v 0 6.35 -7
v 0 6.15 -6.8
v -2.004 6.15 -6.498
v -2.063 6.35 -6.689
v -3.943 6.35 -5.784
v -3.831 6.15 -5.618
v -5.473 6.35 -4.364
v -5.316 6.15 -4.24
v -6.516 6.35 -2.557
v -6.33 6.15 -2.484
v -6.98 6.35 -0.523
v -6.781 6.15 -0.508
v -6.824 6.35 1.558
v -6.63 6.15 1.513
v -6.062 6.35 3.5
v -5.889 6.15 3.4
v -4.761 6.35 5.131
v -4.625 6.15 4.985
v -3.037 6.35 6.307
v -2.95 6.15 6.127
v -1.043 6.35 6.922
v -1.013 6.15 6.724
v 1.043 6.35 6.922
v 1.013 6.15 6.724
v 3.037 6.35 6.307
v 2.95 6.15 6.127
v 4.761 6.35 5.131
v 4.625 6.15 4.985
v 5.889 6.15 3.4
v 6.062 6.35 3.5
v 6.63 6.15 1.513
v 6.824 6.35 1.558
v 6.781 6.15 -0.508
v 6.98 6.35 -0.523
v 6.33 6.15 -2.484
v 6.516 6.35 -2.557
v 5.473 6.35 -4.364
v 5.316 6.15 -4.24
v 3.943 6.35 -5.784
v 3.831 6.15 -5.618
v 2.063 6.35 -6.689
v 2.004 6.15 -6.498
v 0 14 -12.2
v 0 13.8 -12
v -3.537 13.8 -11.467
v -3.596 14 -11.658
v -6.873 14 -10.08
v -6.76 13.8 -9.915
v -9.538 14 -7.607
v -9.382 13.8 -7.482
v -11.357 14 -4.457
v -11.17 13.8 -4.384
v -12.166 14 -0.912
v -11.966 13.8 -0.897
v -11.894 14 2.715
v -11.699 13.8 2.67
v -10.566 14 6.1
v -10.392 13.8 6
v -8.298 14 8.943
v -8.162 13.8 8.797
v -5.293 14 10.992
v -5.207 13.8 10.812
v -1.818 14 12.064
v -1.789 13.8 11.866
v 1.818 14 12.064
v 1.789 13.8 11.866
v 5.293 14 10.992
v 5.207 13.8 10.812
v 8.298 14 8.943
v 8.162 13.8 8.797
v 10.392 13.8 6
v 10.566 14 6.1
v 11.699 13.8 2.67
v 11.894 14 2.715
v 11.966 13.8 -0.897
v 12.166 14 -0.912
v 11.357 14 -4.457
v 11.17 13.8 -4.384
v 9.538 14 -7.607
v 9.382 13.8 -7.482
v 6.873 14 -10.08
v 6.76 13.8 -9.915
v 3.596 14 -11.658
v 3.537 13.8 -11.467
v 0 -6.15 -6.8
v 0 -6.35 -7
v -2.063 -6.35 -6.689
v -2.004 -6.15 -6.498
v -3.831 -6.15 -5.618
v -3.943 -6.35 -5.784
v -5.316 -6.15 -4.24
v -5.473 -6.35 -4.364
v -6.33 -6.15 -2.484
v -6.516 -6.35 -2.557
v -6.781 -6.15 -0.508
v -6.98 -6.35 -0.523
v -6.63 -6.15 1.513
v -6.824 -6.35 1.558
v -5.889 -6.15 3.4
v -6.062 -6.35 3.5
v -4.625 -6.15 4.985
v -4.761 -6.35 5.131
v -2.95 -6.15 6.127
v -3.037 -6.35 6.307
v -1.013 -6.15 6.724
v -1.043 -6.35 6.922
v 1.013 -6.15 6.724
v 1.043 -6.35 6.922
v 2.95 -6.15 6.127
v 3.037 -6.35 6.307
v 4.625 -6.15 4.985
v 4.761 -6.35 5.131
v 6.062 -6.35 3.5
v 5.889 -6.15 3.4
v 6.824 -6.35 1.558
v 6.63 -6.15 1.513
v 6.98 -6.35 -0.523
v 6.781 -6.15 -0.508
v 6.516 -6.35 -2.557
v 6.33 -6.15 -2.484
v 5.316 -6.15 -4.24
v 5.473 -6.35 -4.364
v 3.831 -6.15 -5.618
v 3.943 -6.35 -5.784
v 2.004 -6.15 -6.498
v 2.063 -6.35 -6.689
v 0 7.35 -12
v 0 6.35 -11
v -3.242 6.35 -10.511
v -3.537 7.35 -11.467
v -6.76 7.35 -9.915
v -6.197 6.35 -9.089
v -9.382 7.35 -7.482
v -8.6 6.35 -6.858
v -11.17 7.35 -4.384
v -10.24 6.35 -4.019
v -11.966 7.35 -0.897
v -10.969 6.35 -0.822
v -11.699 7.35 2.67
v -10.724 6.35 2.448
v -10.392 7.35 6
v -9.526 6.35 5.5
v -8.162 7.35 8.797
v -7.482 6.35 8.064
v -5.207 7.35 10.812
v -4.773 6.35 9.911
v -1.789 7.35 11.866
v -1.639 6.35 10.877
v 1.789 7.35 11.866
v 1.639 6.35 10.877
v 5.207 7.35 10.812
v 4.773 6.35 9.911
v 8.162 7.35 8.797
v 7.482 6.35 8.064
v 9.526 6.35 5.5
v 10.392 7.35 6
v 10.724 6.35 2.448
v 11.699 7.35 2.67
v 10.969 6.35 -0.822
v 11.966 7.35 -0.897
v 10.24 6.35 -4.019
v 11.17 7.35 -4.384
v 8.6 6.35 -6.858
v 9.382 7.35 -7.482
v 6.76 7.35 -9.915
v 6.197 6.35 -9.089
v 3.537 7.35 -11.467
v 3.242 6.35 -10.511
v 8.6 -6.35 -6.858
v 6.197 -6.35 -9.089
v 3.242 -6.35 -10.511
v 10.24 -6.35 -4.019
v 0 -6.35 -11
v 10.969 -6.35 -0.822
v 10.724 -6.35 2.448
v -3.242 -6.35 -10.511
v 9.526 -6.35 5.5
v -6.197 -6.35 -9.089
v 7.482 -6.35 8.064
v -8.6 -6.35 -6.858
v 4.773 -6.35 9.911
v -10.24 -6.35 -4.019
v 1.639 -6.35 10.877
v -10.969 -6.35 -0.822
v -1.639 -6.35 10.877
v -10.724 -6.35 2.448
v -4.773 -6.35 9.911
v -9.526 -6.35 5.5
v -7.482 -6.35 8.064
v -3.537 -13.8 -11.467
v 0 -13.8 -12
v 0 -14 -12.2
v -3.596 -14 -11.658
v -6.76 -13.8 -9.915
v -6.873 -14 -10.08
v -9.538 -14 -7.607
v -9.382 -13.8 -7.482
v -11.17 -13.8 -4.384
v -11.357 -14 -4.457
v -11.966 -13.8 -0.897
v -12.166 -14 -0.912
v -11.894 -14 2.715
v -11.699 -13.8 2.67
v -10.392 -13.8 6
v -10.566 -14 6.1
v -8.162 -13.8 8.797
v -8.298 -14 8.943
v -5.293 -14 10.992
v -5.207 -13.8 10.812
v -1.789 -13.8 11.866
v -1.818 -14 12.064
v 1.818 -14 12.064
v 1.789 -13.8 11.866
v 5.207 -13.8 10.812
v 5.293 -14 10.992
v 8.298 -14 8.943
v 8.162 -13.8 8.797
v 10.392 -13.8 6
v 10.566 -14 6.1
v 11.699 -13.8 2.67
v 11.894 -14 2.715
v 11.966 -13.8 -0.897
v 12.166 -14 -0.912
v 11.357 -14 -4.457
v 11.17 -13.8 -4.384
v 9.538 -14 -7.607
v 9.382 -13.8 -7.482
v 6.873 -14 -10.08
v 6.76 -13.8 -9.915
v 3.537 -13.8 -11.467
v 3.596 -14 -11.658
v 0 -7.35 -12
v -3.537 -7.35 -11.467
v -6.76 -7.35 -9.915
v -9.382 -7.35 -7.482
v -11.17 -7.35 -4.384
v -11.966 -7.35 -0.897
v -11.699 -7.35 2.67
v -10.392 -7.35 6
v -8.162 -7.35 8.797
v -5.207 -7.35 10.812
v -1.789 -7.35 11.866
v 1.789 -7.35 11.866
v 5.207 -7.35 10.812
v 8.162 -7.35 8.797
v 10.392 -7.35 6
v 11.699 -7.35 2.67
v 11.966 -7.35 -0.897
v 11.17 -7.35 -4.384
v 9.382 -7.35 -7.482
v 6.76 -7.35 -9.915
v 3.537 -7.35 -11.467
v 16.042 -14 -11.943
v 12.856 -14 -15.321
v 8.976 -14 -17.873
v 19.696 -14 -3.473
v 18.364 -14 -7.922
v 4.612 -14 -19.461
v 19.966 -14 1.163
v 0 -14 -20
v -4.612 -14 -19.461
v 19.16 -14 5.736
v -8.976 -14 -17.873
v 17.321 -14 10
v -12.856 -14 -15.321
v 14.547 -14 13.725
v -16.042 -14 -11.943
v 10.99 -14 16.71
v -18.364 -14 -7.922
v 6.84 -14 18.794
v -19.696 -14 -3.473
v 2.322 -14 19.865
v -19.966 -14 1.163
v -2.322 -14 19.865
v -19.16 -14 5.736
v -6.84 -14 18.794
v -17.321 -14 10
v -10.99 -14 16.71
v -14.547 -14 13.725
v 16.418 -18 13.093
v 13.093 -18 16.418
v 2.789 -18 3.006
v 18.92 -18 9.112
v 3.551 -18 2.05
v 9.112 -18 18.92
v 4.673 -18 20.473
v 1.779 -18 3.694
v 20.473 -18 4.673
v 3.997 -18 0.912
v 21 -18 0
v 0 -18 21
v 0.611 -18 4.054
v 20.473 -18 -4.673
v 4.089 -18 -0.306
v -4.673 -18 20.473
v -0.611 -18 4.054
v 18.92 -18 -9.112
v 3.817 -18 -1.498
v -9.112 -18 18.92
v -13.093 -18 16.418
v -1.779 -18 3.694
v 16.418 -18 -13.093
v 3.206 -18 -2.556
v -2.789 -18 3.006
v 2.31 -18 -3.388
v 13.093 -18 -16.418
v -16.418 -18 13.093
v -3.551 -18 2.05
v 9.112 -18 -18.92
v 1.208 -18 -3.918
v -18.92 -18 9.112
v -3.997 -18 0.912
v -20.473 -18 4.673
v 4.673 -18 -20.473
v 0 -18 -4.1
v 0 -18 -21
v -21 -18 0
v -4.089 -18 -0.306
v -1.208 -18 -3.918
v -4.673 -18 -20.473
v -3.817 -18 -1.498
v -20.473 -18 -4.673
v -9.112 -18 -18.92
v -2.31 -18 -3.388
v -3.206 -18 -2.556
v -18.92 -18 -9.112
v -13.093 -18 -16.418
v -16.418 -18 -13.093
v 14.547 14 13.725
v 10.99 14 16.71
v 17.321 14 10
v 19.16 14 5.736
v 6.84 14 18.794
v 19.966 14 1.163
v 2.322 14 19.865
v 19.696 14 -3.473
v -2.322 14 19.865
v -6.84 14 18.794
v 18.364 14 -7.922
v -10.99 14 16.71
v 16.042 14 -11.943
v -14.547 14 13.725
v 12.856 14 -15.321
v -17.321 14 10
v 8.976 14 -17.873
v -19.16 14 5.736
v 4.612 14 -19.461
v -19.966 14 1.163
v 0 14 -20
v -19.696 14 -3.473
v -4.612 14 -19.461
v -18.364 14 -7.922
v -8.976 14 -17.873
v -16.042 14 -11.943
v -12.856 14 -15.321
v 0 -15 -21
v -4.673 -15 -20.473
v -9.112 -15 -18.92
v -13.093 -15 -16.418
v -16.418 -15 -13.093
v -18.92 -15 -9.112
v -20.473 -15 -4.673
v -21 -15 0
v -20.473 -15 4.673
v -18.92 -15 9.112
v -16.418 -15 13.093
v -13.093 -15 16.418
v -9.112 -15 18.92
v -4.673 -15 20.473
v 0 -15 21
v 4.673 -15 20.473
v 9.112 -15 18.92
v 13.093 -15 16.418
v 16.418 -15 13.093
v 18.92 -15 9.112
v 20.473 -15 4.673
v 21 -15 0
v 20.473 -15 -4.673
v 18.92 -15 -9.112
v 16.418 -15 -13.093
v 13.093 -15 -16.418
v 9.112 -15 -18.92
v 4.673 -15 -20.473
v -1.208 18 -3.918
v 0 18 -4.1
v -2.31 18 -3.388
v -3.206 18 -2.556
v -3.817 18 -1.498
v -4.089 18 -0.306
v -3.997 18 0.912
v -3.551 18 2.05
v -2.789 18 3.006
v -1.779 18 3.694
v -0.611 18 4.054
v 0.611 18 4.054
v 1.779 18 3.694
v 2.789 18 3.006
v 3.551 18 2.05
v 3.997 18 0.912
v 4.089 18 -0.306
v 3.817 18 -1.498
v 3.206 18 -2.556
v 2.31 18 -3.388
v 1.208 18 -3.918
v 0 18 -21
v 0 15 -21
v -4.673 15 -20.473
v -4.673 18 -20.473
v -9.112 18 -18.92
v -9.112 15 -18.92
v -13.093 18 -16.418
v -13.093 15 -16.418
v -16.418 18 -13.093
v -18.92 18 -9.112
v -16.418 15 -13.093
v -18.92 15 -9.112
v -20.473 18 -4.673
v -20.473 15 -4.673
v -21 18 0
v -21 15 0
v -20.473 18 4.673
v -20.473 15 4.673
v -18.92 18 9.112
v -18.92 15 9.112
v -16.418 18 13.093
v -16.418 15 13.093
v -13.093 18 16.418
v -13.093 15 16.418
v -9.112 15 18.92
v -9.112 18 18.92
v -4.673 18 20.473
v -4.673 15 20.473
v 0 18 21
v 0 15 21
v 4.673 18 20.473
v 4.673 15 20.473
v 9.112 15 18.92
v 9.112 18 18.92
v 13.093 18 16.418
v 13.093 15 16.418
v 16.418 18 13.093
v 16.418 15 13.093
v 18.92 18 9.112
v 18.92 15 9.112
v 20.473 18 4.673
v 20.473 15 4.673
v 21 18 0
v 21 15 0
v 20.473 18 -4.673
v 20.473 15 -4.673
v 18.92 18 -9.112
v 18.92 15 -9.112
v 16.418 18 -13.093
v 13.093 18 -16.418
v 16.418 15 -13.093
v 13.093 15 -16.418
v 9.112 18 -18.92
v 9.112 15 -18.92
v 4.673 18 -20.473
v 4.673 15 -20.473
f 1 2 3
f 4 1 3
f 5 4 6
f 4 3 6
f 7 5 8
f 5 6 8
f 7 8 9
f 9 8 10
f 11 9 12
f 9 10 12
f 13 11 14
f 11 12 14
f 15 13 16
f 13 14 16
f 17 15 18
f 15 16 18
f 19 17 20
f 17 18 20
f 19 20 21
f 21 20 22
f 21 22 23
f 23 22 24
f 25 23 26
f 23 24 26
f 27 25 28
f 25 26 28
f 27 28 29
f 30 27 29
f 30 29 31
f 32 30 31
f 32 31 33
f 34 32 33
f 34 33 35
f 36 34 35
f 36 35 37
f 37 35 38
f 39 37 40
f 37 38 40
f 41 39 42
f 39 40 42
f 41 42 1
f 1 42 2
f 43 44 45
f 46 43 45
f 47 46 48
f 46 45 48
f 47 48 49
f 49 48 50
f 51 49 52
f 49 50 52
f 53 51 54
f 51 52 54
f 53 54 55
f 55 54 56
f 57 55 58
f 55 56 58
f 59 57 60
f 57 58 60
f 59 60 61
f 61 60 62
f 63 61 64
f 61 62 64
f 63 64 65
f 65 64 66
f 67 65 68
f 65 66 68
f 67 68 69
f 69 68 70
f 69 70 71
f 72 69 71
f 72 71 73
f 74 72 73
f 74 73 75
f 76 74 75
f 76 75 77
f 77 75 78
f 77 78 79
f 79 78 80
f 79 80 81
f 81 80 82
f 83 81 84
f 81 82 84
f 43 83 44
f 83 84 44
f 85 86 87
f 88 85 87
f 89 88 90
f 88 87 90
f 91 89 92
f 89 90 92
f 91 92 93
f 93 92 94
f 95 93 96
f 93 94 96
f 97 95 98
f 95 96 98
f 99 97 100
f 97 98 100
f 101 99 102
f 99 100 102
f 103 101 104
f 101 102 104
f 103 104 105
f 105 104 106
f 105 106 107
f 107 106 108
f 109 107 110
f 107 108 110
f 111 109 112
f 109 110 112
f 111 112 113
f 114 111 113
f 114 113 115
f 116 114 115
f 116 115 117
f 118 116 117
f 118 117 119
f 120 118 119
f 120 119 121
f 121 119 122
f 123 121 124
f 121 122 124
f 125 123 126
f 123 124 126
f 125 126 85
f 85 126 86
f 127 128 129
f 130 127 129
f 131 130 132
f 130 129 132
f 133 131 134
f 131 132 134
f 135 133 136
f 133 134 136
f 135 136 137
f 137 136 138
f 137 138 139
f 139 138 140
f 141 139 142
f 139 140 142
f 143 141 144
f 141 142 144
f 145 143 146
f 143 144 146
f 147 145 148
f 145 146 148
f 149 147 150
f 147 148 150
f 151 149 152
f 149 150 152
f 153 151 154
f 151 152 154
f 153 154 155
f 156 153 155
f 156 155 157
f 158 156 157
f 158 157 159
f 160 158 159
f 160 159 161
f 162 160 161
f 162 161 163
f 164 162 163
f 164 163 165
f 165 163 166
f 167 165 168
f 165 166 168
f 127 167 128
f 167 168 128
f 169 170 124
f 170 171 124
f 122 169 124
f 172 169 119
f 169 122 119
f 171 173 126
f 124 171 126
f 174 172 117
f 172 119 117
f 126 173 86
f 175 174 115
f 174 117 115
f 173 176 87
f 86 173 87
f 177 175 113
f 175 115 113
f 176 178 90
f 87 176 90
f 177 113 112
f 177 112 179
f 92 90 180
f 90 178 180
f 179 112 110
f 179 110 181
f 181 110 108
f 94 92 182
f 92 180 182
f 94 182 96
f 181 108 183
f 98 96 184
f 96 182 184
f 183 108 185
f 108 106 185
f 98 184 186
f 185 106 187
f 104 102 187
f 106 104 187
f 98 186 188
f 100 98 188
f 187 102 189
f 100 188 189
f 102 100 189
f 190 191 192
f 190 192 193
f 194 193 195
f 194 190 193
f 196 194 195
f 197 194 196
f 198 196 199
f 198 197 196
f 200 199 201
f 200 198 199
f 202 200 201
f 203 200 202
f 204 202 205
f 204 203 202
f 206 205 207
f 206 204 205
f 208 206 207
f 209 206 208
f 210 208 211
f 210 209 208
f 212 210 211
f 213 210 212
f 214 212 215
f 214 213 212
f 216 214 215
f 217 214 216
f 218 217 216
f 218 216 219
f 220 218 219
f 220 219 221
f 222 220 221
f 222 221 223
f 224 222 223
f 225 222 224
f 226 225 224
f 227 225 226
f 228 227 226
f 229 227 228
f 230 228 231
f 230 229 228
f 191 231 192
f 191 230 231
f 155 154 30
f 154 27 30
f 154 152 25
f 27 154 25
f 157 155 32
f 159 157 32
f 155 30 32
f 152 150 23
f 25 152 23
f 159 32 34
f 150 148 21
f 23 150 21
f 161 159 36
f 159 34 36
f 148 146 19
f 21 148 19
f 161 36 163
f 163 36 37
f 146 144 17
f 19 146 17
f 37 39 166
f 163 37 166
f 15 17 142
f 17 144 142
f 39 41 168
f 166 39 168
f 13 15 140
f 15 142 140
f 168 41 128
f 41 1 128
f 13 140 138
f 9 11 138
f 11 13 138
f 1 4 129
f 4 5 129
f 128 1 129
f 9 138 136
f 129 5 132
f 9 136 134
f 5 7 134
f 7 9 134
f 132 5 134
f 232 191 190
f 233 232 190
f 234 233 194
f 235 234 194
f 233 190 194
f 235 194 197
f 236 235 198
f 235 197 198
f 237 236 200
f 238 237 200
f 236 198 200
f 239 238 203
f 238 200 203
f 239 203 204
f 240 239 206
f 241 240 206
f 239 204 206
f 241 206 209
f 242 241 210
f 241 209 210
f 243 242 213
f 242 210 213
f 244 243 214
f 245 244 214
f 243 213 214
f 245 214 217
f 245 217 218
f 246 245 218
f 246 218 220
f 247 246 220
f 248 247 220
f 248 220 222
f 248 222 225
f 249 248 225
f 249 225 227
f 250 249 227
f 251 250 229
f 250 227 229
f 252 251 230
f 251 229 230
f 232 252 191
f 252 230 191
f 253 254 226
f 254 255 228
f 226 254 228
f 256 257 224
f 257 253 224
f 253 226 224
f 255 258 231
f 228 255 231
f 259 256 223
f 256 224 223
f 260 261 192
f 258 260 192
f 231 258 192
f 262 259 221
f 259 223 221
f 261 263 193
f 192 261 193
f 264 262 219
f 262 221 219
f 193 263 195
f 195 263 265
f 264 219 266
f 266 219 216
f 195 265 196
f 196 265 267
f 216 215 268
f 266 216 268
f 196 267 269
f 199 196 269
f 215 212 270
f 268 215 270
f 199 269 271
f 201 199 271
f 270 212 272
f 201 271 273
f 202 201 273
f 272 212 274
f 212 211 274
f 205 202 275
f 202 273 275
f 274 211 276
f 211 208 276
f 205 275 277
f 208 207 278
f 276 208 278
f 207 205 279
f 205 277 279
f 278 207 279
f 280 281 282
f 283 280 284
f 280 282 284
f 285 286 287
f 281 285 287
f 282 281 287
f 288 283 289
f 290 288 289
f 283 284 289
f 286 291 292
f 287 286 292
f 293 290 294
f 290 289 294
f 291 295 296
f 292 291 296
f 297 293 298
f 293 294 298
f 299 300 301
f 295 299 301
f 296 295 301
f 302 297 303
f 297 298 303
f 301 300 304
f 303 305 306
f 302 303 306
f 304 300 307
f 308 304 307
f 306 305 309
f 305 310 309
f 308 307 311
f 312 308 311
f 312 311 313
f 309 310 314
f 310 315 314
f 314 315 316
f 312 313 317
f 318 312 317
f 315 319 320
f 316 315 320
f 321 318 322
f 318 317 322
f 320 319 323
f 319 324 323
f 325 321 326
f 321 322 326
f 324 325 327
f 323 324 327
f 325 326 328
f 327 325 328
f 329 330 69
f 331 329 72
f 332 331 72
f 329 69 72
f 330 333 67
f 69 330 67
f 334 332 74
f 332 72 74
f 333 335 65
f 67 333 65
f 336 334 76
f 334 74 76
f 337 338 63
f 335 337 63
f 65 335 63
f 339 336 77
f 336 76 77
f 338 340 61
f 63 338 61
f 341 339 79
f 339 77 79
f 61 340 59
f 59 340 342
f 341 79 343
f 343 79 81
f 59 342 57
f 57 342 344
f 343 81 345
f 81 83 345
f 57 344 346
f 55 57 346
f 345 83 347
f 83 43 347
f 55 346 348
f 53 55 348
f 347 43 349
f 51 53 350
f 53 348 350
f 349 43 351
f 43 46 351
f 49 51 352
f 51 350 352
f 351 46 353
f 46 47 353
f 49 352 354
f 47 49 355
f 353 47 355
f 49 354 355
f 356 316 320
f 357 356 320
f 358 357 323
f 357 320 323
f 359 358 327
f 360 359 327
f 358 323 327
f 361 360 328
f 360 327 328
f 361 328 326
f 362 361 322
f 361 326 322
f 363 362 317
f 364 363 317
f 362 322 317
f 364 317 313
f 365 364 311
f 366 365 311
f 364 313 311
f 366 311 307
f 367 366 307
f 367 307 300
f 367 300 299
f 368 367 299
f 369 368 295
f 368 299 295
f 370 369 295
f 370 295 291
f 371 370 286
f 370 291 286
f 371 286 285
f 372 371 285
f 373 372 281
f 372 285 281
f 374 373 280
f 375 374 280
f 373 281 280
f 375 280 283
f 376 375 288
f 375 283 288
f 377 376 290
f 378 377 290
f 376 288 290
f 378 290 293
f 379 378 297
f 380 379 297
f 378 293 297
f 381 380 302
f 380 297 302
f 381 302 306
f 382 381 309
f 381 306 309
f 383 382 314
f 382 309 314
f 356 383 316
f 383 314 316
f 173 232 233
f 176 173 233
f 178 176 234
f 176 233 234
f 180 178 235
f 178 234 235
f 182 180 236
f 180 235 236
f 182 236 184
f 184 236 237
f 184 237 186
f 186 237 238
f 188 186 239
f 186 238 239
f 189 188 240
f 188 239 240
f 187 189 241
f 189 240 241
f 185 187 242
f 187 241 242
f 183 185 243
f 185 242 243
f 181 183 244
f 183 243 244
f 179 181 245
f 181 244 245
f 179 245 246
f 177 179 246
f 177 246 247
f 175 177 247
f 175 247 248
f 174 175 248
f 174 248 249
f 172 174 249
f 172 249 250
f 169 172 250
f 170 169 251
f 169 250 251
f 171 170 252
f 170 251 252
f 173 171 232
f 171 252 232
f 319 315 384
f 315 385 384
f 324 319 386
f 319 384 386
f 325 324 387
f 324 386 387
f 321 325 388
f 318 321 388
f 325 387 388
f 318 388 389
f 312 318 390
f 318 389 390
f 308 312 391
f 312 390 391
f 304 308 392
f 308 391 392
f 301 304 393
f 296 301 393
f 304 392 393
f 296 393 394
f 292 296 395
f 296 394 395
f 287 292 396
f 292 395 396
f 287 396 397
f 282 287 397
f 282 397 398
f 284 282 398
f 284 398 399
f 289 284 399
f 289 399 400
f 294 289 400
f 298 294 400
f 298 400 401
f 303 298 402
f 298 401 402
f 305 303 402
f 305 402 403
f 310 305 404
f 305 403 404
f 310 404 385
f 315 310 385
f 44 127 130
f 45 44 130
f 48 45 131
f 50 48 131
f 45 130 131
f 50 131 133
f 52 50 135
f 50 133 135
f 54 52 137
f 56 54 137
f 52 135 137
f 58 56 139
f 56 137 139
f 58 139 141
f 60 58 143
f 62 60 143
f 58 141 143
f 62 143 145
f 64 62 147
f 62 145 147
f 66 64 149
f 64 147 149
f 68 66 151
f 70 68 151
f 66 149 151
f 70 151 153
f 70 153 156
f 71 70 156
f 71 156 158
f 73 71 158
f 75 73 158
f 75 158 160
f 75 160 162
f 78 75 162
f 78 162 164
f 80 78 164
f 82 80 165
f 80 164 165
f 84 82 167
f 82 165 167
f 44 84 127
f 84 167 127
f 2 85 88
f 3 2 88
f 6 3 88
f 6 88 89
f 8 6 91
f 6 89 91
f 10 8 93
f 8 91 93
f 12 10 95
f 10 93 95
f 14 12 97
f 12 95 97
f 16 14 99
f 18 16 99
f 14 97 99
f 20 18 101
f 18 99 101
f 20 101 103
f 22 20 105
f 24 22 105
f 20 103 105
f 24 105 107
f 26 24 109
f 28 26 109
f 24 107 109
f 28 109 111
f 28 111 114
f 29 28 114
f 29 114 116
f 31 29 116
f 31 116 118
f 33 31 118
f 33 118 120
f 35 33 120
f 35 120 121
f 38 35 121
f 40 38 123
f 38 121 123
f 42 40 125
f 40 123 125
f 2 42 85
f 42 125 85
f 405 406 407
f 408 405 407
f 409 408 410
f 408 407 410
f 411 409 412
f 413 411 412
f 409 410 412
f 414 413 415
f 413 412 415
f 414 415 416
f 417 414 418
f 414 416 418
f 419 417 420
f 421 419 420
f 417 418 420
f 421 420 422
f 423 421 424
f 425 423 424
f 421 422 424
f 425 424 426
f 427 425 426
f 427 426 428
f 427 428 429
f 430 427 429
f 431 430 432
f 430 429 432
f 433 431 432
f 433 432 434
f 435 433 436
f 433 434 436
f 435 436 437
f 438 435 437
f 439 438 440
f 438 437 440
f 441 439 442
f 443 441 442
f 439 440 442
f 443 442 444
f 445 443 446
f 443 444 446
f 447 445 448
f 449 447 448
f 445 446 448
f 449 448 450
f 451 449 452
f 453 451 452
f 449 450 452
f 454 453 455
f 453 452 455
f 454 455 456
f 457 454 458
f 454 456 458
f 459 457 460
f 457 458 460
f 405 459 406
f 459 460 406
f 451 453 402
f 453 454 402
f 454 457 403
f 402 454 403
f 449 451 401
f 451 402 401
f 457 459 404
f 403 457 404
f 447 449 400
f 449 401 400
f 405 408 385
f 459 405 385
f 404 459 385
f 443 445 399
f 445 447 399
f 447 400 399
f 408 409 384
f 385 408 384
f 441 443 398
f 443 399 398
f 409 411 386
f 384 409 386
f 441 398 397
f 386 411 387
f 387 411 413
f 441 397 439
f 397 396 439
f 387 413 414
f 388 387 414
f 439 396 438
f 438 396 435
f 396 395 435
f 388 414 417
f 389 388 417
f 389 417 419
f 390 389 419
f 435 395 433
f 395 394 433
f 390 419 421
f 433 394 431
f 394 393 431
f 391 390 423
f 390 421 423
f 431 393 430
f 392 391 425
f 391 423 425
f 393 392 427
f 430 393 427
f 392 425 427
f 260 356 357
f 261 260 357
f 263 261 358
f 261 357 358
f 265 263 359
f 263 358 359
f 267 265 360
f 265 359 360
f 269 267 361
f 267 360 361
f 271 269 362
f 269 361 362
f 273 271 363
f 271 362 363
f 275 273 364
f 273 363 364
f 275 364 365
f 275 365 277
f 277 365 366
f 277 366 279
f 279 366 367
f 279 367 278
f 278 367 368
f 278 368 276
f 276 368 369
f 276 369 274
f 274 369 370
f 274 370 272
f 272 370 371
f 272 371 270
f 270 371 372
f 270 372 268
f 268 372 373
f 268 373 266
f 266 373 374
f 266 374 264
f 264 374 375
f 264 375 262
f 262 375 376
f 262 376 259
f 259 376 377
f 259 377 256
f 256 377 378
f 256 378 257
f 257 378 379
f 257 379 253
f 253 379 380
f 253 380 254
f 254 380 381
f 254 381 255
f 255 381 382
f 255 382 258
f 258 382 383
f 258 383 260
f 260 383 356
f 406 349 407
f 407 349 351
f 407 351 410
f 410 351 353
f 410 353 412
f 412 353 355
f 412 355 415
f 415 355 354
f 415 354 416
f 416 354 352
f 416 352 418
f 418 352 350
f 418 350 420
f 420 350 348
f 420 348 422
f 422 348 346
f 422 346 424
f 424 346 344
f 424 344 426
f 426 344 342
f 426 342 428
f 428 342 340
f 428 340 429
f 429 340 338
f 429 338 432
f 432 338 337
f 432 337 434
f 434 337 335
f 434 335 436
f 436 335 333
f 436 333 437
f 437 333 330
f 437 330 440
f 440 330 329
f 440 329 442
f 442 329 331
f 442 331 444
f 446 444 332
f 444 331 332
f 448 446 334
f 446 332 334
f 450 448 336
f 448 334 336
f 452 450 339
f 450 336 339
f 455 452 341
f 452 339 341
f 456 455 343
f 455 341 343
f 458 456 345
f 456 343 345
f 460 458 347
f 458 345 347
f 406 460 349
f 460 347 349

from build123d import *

# Parameters (mm, degrees)
CHAMFER1_SIZE = 1
CHAMFER2_SIZE = 0.2


with BuildPart() as part:
    # Sketch1 → Revolve1 (revolve)
    with BuildSketch(Plane(origin=(0, 0, 0), x_dir=(0, 0, -1), z_dir=(1, 0, 0))):
        Polygon((4.1, 18), (21, 18), (21, 14), (12, 14), (12, 6.35), (6.8, 6.35), (6.8, -6.35), (12, -6.35), (12, -14), (21, -14), (21, -18), (4.1, -18), align=None)
    revolve(axis=Axis((0, -56.19047619, 0), (0, 1, 0)))

    # Chamfer1
    chamfer1_edges = [part.edges().sort_by_distance(p)[0] for p in [
        (0, -14, 21),
        (0, 14, 21),
        (0, 6.35, 12),
        (0, -6.35, 12),
    ]]
    chamfer(chamfer1_edges, length=CHAMFER1_SIZE)

    # Chamfer2
    chamfer2_edges = [part.edges().sort_by_distance(p)[0] for p in [
        (0, 14, 12),
        (0, 6.35, 6.8),
        (0, -6.35, 6.8),
        (0, -14, 12),
    ]]
    chamfer(chamfer2_edges, length=CHAMFER2_SIZE)


solid = part.part
